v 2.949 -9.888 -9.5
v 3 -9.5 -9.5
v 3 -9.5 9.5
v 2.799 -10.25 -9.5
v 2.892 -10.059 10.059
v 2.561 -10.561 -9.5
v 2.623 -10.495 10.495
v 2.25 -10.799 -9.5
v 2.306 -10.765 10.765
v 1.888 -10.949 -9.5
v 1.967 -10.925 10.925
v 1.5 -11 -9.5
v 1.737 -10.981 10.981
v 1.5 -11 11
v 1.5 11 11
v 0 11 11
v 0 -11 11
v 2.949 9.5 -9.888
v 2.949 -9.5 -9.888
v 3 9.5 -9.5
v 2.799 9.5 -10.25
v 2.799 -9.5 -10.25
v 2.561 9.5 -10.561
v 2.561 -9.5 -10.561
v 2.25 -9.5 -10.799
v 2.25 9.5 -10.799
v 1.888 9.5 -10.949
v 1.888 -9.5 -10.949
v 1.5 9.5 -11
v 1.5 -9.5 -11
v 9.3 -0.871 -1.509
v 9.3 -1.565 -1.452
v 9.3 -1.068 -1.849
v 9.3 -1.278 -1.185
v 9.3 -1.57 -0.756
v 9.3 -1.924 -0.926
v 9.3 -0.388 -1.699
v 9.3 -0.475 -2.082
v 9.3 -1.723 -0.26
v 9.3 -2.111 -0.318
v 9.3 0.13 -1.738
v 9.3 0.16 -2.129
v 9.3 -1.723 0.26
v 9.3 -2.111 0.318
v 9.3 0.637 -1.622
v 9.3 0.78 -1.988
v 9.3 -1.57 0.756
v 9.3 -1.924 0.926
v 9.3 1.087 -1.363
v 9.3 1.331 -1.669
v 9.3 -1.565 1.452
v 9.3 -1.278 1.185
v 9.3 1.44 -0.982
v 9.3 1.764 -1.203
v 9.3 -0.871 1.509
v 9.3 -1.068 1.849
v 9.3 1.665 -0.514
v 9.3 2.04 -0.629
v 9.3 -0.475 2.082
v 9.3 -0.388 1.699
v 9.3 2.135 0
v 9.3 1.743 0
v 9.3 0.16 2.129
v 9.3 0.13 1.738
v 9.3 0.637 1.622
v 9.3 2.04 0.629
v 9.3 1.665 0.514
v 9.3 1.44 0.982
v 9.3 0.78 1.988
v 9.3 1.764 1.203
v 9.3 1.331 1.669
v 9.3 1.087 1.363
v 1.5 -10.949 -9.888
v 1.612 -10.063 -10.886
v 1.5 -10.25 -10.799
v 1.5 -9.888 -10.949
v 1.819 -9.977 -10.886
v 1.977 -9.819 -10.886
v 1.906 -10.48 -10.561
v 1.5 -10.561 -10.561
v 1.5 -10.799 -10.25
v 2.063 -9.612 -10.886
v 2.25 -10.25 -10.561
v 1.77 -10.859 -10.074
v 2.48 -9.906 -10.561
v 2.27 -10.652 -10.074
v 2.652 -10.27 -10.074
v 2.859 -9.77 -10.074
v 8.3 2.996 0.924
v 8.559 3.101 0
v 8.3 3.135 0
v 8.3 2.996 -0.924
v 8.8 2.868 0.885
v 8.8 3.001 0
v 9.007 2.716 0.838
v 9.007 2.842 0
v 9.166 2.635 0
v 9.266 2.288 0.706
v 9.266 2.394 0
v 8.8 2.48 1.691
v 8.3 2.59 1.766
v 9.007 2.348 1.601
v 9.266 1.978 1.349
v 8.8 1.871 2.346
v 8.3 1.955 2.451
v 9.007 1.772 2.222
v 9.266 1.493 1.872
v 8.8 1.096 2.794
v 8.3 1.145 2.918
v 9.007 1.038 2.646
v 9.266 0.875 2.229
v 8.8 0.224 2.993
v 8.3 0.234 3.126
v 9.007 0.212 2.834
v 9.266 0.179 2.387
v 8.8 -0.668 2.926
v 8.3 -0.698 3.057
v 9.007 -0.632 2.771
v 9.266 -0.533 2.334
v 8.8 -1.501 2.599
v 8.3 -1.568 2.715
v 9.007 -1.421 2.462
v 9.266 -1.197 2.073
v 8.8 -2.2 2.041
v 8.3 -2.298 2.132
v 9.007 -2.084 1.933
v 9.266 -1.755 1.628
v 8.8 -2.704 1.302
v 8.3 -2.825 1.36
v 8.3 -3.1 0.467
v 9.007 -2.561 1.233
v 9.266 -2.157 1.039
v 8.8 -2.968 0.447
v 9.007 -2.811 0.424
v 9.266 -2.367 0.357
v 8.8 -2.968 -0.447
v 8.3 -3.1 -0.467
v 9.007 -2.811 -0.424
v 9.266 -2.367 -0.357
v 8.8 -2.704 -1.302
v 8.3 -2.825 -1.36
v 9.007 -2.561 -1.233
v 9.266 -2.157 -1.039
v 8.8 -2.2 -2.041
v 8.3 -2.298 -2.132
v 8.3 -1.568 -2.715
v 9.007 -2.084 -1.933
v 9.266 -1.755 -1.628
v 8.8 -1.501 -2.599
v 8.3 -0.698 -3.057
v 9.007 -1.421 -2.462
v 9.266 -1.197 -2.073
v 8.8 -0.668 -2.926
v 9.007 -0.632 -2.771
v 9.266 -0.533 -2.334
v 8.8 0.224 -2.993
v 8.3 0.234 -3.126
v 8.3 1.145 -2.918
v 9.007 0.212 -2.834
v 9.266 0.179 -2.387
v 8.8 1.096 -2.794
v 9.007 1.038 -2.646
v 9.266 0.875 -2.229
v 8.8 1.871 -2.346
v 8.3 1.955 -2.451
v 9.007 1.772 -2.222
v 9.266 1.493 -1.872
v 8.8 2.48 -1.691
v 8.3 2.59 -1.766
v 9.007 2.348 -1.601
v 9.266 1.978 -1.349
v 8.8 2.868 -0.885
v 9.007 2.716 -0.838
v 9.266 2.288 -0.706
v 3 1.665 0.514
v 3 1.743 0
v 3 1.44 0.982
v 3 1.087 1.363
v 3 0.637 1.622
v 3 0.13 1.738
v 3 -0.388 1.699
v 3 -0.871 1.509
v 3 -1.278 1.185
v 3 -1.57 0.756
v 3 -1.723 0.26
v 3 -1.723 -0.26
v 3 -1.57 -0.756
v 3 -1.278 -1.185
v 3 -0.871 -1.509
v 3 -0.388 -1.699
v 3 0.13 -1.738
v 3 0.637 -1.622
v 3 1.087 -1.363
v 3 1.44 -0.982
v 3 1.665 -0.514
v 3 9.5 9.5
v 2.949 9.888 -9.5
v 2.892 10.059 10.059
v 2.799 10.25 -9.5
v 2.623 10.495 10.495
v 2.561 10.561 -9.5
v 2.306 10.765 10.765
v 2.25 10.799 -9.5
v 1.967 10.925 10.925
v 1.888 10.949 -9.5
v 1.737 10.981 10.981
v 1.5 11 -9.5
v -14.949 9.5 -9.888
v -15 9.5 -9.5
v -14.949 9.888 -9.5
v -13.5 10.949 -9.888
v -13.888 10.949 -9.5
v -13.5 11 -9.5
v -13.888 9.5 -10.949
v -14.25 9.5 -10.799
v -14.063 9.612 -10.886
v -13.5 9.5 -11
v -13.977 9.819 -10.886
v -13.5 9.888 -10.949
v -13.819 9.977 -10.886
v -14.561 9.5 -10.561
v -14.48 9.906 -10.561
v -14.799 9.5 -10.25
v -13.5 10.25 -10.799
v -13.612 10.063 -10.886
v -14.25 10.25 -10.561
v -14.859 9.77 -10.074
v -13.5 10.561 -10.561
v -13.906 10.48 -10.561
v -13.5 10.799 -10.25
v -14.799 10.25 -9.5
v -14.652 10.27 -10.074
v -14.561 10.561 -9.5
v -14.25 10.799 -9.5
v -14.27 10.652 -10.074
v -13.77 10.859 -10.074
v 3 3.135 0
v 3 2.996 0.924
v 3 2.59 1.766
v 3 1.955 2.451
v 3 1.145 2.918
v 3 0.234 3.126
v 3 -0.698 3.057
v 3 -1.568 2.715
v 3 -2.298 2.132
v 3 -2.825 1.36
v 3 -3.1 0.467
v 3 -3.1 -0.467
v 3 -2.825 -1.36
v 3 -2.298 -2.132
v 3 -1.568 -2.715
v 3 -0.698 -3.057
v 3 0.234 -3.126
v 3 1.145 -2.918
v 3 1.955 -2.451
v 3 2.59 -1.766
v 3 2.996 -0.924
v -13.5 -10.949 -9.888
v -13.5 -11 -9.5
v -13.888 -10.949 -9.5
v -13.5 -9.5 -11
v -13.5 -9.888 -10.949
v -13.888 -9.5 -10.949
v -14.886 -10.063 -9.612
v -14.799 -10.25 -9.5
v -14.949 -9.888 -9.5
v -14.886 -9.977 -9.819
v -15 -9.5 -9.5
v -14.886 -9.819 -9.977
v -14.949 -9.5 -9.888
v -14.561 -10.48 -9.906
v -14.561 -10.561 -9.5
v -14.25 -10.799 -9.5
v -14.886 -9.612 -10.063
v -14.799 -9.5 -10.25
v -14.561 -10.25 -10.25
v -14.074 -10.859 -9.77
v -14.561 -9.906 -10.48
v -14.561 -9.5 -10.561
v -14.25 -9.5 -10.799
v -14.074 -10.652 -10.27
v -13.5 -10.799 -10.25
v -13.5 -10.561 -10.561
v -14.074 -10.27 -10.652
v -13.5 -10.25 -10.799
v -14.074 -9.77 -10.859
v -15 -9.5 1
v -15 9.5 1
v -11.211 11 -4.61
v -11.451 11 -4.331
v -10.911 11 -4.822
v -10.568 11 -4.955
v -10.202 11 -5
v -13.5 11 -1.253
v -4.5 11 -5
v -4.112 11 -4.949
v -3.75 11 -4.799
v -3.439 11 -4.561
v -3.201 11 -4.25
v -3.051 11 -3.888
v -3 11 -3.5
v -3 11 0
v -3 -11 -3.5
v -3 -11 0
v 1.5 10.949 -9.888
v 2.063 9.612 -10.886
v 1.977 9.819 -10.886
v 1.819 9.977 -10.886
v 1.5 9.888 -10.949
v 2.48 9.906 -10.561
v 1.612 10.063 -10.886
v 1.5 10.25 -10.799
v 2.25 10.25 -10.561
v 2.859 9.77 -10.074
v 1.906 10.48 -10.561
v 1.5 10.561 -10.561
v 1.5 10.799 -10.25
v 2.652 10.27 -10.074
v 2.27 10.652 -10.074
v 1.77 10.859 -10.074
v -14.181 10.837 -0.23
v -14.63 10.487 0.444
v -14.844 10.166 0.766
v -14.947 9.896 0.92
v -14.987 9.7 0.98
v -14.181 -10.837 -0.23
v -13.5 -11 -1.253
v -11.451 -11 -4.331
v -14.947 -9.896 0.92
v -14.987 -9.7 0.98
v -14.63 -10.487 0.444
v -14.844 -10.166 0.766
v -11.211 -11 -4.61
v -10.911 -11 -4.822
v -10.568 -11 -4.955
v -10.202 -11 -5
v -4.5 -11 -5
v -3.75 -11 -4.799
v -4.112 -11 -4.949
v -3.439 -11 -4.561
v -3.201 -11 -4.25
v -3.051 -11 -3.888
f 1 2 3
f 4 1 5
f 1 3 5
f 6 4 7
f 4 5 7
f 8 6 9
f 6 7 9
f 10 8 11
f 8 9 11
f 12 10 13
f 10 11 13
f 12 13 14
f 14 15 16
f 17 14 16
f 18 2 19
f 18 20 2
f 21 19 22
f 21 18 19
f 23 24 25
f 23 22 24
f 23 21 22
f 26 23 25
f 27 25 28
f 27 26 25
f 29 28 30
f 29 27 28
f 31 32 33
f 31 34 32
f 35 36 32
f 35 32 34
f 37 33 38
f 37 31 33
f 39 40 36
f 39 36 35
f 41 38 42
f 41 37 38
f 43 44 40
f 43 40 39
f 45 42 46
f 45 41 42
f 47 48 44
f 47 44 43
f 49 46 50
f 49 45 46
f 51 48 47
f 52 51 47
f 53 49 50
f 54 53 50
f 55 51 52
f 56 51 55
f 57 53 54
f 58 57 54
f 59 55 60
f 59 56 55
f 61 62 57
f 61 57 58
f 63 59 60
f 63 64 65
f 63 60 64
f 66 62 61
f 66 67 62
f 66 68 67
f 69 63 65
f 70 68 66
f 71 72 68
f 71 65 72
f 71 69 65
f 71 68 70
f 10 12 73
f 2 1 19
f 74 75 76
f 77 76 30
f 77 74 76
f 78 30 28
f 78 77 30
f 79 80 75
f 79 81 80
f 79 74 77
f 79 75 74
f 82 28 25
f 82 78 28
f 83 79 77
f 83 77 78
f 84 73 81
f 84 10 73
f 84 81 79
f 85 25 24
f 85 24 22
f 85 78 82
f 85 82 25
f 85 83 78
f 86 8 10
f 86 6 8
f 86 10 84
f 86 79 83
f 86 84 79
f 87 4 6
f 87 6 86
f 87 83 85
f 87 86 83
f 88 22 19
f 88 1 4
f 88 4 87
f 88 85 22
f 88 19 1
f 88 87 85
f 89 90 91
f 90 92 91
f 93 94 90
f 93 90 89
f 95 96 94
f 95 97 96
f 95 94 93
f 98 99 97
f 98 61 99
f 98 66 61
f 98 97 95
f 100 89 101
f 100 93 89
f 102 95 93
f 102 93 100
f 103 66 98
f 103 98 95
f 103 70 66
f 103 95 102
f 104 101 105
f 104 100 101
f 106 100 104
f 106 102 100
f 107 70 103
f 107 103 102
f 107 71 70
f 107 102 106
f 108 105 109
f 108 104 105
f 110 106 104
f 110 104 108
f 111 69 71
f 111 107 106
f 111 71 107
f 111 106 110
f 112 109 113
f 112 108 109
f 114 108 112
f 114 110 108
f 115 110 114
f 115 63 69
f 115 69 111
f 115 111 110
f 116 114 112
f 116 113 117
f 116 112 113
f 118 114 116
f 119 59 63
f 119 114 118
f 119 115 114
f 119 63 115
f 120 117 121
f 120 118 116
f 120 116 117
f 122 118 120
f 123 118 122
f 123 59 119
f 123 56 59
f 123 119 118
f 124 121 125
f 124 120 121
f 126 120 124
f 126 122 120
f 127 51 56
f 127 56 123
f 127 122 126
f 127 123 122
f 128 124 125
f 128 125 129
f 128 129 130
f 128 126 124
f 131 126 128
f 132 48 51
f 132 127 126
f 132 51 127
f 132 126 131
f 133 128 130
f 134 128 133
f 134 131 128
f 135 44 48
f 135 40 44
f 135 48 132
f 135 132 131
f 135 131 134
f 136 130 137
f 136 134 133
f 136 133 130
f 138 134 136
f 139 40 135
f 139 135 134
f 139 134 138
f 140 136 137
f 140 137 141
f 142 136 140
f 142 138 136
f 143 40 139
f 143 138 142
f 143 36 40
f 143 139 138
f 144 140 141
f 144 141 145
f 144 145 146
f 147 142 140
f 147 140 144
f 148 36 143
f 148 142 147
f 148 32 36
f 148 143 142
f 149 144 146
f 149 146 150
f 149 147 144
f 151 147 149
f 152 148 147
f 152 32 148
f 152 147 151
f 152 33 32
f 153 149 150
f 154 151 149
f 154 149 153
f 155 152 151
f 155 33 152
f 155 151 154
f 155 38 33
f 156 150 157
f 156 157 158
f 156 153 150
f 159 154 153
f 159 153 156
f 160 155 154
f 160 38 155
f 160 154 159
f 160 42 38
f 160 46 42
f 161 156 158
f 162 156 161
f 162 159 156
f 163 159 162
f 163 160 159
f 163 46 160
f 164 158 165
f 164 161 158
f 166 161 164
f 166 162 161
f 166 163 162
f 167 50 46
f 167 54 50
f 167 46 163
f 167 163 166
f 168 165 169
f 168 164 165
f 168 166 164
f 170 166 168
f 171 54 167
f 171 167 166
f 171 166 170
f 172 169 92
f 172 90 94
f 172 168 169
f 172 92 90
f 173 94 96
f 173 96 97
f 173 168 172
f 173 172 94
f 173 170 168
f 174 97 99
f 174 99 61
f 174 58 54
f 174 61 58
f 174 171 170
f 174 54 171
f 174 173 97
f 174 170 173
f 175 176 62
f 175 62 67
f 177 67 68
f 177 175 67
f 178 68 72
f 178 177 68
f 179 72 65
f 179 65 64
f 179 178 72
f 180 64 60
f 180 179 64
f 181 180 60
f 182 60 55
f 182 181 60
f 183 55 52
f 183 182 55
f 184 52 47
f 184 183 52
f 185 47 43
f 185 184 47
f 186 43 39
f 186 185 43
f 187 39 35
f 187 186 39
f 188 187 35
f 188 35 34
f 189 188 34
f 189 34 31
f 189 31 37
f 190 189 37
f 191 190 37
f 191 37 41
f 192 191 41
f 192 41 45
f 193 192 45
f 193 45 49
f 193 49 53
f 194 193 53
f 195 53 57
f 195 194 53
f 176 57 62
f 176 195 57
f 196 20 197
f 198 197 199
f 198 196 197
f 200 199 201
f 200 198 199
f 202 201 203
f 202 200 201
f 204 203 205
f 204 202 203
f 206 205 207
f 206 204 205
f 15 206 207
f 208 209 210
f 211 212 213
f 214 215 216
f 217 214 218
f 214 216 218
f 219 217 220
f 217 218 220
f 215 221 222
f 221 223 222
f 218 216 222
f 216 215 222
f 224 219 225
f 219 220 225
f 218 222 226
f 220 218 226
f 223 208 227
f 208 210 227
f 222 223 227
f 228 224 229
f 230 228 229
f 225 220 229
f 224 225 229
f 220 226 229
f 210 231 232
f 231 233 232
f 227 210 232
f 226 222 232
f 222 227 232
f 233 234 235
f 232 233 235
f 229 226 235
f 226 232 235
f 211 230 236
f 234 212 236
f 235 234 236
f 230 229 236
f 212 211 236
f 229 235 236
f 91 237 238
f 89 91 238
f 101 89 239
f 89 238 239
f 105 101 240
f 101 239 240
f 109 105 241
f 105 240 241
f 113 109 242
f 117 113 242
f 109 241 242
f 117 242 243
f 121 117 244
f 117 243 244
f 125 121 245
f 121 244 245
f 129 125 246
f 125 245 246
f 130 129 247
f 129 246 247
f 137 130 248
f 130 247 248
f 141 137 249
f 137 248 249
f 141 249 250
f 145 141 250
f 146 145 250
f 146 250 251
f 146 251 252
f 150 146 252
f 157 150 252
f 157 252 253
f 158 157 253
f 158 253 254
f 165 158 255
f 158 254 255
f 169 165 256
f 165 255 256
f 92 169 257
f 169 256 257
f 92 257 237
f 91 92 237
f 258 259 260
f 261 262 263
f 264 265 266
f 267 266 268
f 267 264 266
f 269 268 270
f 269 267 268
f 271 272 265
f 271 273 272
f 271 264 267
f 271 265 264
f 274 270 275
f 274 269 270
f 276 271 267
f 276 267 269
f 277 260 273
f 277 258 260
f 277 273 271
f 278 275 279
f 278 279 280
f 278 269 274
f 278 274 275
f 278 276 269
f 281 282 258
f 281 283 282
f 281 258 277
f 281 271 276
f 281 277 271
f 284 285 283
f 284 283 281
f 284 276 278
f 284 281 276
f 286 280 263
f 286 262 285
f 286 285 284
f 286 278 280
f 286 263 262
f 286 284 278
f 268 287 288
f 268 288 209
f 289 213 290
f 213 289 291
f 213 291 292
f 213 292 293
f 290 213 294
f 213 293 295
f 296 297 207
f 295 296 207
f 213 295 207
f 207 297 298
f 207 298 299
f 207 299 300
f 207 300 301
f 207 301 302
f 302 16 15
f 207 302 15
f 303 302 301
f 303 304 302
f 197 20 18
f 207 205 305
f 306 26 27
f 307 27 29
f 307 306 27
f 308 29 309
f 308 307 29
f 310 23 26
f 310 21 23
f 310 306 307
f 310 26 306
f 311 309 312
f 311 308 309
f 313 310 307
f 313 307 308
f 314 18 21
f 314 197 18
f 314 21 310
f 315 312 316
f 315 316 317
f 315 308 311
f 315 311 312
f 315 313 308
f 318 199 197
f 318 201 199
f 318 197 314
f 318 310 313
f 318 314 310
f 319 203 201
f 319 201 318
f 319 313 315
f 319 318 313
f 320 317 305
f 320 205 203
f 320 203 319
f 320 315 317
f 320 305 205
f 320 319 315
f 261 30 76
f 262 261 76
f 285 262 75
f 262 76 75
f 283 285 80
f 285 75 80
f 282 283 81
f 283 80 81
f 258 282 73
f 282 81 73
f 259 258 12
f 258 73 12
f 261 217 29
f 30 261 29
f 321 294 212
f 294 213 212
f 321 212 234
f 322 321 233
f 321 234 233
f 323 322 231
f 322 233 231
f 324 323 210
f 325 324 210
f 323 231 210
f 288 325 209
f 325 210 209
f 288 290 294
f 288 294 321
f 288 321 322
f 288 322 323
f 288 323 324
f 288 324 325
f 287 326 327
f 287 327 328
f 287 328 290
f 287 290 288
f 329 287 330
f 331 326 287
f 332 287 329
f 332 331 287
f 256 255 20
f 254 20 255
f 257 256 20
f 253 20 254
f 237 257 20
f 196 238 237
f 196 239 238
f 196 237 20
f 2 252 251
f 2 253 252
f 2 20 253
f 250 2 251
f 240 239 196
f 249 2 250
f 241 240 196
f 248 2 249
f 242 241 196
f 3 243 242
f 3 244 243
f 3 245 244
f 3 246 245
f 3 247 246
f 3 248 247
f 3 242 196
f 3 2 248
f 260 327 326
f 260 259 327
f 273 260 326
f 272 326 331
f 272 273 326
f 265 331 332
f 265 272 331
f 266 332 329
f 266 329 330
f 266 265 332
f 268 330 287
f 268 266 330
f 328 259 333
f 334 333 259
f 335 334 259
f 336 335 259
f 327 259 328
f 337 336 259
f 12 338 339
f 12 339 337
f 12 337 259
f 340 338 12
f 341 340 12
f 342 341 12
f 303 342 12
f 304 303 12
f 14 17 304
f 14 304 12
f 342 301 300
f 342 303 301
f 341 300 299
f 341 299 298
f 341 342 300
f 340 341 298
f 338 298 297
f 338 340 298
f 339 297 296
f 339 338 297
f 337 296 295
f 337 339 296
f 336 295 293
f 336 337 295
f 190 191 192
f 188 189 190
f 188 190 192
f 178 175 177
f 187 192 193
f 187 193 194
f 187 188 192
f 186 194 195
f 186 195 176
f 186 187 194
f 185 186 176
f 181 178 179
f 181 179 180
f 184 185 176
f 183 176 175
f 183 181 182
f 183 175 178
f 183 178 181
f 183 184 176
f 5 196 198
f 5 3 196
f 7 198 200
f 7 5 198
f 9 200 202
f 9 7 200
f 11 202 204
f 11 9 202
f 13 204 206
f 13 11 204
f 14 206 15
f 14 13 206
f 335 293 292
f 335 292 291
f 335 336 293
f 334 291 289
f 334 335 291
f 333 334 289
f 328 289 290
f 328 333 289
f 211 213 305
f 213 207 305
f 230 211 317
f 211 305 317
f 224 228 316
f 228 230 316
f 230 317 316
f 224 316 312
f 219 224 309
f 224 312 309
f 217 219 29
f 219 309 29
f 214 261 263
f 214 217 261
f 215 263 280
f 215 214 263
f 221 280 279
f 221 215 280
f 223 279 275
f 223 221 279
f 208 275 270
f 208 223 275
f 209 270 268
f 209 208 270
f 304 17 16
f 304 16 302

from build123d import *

# Parameters (mm, degrees)
F1_DEPTH      = 11
F1_DEPTH_BACK = 11
F2_R          = 3.135192
F2_R_2        = 1.742831
F3_DEPTH      = 6.3
F4_R          = 1.5
F5_R          = 1
F3_FACE_R     = 1.742831
F6_DEPTH      = 1.5


with BuildPart() as f1:
    # F0 (on Front) → F1 (new body, two sides)
    with BuildSketch(Plane.XZ) as f1_sk:
        Polygon((-3, -11), (3, -11), (3, -3.201166), (3, 0), (3, 3.152842), (3, 11), (0, 11), (-3, 0), (-3, -5), (-11.005839, -5), (-15, 1), (-15, -5), (-15, -11), align=None)
    extrude(amount=F1_DEPTH)
    extrude(f1_sk.sketch, amount=-F1_DEPTH_BACK)

    # F2 (on face) → F3 (join)
    with BuildSketch(Plane.YZ.offset(3)):
        Circle(F2_R)
        Circle(F2_R_2, mode=Mode.SUBTRACT)
    extrude(amount=F3_DEPTH)

    # F4
    f4_edges = [f1.edges().sort_by_distance(p)[0] for p in [
        (3, -11, 0),
        (-6, -11, -11),
        (-15, -11, -5),
        (3, 0, 11),
        (3, 11, 0),
        (3, 0, -11),
        (-15, 11, -5),
        (-15, 0, -11),
        (-6, 11, -11),
        (-3, 0, -5),
        (-11.005839, 0, -5),
    ]]
    fillet(f4_edges, radius=F4_R)

    # F5
    f5_edges = [f1.edges().sort_by_distance(p)[0] for p in [
        (9.3, -3.135192, 0),
    ]]
    fillet(f5_edges, radius=F5_R)

    # F3_face (on face) → F6 (join)
    with BuildSketch(Plane.YZ.offset(3)):
        Circle(F3_FACE_R)
    extrude(amount=-F6_DEPTH)


solid = f1.part
